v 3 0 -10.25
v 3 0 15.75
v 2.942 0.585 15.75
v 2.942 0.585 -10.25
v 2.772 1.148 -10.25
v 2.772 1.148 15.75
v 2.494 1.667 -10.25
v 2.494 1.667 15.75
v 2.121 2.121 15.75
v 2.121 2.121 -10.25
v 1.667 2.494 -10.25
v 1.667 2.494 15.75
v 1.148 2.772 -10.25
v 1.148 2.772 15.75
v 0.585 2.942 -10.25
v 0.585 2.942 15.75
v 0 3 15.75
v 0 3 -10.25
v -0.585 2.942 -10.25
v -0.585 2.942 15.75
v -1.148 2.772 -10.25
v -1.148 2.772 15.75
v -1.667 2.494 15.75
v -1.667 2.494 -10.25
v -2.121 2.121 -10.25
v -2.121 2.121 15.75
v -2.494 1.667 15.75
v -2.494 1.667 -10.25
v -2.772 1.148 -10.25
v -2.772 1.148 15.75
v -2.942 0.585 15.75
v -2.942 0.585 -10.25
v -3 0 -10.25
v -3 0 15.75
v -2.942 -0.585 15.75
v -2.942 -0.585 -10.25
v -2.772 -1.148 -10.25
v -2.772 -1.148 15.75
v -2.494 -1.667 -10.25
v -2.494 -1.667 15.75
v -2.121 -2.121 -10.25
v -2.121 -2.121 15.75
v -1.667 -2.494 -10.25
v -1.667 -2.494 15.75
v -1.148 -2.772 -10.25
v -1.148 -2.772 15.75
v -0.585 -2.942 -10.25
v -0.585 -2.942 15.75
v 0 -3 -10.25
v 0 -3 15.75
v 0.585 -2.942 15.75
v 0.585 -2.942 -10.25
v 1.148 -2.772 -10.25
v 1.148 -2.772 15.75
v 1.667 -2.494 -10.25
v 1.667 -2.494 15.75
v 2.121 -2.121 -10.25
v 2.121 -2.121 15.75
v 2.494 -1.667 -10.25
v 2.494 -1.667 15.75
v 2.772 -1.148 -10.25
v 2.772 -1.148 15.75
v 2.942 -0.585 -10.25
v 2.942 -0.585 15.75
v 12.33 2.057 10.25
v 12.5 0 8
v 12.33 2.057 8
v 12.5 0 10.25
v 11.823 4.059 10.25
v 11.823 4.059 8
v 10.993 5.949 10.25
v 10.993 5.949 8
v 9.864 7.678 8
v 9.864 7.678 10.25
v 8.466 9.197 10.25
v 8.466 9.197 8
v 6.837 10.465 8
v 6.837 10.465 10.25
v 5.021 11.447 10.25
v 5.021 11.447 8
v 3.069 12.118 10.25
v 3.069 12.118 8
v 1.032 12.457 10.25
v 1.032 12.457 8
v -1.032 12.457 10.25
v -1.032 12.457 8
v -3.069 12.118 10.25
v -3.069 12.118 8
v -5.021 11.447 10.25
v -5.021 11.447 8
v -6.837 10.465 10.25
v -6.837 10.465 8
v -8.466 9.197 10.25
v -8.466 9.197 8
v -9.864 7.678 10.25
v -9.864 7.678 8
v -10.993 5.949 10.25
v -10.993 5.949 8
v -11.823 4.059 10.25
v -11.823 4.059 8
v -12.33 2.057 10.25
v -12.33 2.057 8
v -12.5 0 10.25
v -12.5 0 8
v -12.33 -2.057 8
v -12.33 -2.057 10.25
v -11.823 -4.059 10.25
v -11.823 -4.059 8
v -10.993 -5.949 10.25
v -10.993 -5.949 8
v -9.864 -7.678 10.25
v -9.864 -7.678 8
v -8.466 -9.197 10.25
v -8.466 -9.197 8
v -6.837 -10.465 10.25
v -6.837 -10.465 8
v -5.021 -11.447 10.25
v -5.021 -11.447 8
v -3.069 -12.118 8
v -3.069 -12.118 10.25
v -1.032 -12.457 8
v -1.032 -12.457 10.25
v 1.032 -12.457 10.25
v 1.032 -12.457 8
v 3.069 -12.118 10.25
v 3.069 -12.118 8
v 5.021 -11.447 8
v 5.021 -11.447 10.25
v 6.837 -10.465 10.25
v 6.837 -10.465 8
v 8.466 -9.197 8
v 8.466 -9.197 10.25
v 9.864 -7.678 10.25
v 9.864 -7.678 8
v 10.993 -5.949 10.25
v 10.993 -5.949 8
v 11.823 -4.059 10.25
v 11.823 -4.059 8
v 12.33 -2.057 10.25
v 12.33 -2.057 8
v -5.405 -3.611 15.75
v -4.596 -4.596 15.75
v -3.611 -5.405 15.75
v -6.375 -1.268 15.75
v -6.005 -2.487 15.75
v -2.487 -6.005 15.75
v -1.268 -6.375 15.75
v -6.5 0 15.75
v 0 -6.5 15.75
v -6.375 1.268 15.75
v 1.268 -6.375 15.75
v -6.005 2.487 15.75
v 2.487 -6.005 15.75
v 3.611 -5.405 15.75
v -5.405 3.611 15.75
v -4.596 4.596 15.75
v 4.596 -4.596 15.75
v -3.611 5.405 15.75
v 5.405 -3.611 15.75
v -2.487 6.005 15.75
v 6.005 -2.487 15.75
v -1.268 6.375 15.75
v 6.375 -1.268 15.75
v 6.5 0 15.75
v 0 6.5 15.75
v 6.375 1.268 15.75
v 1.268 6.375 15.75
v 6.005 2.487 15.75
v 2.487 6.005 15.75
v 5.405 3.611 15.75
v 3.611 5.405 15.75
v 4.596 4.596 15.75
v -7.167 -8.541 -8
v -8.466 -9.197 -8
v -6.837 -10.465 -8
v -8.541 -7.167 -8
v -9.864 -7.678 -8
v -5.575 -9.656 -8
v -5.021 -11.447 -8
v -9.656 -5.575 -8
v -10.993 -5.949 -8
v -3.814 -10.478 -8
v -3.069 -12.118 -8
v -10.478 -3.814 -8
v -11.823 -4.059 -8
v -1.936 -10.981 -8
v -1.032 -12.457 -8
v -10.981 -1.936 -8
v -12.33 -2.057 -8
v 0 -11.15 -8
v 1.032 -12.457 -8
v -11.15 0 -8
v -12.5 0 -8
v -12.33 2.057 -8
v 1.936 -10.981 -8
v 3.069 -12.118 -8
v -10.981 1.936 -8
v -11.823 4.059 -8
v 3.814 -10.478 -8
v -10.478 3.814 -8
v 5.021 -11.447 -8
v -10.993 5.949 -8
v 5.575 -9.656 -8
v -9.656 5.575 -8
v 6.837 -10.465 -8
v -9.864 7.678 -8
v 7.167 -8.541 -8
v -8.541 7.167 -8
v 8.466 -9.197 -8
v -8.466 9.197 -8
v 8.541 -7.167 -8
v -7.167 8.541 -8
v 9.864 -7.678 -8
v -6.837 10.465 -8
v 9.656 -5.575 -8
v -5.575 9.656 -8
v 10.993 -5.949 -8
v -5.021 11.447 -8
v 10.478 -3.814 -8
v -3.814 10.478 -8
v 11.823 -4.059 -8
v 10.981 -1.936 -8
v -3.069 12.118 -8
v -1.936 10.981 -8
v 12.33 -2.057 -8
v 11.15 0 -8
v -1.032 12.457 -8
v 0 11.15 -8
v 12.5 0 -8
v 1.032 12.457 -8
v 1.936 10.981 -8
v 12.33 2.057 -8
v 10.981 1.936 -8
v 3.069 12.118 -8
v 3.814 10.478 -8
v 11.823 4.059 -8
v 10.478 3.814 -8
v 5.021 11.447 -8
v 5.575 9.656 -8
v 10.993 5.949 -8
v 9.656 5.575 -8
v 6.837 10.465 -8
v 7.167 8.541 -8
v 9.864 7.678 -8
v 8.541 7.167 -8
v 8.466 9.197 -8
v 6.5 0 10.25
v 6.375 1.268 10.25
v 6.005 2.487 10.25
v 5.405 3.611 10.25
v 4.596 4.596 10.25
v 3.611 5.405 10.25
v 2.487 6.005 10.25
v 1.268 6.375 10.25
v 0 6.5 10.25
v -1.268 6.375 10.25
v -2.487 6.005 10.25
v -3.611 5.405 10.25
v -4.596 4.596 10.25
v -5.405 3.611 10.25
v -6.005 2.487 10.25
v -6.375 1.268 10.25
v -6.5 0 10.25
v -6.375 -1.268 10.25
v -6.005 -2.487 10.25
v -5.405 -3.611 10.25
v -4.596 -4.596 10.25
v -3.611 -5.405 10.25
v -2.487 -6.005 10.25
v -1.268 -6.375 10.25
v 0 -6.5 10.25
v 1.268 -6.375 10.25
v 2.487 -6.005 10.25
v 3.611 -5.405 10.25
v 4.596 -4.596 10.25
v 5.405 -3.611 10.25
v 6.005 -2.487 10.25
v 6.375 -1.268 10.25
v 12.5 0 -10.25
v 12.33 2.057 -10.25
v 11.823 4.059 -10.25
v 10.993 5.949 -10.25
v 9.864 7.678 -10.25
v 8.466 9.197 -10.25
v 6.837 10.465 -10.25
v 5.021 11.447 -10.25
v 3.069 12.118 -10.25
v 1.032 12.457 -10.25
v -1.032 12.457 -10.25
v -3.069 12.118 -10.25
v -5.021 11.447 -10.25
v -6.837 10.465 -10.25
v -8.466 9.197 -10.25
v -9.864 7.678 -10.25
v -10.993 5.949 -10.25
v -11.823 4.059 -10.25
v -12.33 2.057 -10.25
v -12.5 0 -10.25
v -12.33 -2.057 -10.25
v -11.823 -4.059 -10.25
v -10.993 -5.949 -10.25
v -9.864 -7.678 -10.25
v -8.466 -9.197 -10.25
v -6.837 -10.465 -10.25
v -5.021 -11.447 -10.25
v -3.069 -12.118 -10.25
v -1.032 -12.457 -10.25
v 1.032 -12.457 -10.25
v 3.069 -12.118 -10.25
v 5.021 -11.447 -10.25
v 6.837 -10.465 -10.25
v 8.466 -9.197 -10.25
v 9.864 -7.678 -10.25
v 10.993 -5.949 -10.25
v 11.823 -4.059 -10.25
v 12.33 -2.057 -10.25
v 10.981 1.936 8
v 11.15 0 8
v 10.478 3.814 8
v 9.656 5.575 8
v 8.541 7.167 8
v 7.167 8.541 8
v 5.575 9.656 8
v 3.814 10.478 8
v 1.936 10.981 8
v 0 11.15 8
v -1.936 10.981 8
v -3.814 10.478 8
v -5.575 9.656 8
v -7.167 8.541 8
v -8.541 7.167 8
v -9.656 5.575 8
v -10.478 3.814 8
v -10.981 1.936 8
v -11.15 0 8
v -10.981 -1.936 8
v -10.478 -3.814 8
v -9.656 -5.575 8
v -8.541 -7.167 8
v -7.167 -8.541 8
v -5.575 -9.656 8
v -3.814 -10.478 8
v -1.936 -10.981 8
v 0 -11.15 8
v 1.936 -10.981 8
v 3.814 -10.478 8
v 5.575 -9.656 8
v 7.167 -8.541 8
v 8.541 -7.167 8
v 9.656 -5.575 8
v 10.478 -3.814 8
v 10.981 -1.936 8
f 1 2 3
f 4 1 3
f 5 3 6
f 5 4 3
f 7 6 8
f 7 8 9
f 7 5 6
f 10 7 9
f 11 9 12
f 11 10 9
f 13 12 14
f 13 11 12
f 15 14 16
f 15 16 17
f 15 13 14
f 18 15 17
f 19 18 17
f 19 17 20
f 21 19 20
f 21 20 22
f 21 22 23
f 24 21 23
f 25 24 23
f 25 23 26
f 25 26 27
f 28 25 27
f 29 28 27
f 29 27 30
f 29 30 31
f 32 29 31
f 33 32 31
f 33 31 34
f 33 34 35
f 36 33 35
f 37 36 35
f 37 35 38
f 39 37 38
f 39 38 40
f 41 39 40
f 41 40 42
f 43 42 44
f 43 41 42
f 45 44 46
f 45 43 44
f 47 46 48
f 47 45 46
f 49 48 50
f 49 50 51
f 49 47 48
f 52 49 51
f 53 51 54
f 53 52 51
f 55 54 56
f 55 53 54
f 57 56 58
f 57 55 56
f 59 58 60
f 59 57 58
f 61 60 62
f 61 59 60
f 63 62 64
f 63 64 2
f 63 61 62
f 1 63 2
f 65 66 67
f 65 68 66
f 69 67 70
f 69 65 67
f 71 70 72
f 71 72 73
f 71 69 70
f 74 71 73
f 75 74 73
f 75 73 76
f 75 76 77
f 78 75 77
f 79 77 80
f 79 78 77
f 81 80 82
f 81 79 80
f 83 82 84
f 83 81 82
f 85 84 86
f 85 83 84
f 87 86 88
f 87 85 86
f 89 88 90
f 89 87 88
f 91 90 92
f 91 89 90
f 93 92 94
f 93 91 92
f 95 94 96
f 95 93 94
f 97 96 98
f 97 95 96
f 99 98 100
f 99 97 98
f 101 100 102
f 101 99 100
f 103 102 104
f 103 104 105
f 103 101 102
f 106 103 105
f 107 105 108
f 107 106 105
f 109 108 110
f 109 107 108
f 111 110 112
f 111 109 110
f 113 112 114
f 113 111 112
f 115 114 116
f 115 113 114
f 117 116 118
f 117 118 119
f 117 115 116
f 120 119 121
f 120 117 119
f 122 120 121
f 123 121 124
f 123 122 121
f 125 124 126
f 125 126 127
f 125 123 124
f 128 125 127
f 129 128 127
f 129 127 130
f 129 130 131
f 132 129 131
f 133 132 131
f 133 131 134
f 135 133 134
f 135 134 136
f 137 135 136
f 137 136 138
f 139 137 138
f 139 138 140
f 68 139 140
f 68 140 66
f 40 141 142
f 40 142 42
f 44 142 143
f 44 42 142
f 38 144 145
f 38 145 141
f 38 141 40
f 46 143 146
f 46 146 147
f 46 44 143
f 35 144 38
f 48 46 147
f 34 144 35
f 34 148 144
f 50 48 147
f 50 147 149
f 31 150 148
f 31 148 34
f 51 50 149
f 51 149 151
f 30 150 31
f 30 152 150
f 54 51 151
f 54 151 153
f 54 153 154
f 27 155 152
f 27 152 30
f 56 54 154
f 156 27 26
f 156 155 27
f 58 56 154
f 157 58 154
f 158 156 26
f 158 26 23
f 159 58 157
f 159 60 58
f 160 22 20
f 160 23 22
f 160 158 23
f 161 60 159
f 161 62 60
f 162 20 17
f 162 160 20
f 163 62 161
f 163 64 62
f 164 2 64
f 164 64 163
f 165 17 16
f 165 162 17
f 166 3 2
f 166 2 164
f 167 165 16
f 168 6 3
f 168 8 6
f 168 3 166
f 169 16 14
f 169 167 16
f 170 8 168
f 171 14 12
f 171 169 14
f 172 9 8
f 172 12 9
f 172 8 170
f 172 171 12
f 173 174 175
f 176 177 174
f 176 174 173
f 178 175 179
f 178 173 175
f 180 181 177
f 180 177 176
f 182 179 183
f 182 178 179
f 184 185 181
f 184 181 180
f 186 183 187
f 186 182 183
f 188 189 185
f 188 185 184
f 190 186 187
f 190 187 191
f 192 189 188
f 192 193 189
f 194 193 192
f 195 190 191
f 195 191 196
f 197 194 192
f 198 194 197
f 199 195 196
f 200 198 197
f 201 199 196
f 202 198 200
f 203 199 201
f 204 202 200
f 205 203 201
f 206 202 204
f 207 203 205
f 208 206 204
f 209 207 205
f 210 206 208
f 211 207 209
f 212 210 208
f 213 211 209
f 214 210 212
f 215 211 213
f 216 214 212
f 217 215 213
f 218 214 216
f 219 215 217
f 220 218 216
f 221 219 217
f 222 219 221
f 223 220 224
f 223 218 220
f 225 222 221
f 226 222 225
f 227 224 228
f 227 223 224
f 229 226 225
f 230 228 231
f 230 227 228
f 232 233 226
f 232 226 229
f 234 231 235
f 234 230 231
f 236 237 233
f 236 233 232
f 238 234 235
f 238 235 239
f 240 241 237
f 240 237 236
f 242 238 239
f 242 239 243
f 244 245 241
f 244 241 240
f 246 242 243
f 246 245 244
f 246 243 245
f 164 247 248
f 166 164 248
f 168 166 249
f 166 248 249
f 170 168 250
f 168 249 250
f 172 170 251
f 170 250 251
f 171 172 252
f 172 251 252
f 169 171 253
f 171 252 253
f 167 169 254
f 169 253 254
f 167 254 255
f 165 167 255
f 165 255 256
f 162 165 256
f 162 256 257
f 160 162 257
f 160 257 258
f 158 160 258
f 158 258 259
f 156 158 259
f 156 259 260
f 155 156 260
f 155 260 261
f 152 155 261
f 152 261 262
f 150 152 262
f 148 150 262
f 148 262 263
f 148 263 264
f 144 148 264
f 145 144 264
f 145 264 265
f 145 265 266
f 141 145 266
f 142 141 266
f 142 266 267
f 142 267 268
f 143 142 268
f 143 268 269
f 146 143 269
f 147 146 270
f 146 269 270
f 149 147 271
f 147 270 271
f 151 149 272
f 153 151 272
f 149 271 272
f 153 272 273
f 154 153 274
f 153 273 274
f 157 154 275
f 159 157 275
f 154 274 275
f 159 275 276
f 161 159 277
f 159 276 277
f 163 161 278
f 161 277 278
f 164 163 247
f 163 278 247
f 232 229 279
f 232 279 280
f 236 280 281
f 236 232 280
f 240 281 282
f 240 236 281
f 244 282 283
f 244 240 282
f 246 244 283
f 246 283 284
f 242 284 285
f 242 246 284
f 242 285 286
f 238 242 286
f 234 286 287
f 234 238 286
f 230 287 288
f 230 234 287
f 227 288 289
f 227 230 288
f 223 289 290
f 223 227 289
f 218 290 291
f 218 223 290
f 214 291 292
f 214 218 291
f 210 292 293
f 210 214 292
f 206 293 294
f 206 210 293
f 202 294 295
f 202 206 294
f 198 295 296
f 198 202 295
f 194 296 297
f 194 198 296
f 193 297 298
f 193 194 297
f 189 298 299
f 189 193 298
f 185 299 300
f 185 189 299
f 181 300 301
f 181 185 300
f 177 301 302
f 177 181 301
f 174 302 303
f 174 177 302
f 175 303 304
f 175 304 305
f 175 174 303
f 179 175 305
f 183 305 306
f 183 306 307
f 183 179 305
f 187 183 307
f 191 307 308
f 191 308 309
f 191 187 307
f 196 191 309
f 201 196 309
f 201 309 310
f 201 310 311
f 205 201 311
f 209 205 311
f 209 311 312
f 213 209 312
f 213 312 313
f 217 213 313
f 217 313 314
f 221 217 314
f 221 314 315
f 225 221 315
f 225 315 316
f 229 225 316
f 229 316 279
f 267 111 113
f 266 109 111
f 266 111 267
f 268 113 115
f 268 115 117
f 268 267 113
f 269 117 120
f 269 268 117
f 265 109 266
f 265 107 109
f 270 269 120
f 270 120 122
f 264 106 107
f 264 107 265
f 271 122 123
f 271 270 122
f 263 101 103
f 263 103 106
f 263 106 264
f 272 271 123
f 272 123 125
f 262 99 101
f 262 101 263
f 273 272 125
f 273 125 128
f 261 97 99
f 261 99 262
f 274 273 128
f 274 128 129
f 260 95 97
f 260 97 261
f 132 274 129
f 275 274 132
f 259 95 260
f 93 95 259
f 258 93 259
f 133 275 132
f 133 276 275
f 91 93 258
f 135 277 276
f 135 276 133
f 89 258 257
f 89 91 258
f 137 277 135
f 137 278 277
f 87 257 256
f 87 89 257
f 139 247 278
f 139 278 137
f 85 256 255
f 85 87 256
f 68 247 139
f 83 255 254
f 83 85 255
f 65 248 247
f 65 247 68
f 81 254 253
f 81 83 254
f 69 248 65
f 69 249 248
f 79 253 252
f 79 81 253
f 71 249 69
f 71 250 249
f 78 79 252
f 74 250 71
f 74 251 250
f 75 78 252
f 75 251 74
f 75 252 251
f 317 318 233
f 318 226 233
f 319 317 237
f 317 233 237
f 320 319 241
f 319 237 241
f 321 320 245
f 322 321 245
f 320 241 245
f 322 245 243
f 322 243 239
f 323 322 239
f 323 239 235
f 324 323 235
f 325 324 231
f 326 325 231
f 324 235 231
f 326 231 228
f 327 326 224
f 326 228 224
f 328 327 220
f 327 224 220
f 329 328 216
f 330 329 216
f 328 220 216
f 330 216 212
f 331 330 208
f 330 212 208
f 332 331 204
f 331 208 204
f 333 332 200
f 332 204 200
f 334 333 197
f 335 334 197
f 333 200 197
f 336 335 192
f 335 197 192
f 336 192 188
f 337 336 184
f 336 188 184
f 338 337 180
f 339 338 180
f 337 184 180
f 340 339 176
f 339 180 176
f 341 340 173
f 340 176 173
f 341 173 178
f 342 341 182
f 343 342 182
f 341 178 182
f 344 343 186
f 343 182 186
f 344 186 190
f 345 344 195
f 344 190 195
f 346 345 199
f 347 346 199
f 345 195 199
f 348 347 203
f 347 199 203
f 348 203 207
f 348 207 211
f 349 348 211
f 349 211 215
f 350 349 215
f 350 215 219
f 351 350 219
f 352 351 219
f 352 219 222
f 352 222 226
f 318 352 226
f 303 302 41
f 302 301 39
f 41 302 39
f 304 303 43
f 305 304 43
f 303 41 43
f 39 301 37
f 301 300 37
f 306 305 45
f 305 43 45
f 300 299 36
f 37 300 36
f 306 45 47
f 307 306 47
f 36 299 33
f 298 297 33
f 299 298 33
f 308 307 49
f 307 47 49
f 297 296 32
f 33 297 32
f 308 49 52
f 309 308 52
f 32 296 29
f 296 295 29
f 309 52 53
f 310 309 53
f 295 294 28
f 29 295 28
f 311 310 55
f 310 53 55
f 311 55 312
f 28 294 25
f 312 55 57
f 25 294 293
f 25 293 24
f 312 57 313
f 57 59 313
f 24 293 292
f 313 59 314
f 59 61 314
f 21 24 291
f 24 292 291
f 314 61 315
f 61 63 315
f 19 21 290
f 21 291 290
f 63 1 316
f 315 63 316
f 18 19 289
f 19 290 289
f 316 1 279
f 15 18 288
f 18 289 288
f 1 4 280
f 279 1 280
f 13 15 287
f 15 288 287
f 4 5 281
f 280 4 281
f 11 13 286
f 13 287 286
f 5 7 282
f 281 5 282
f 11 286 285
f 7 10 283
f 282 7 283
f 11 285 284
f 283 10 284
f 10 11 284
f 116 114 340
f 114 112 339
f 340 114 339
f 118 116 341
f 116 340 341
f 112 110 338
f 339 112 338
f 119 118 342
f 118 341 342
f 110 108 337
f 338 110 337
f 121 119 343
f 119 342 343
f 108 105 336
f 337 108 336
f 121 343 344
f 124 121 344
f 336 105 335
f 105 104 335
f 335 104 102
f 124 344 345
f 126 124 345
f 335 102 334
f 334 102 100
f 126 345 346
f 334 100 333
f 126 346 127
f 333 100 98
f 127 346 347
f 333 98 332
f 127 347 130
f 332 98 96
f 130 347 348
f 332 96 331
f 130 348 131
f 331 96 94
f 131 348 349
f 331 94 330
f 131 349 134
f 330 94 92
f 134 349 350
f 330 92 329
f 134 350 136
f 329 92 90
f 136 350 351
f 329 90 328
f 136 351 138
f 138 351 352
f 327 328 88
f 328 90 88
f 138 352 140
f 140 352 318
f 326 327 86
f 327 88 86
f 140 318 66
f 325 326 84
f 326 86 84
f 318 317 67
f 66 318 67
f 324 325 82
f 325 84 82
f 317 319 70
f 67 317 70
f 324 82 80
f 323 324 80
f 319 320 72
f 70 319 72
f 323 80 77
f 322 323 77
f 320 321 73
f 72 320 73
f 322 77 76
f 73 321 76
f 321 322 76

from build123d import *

# Parameters (mm, degrees)
F0_R     = 12.5
F0_R_2   = 11.15
F0_R_3   = 6.5
F0_R_4   = 3
F1_DEPTH = 10.25
F2_DEPTH = 8
F3_DEPTH = 15.75


with BuildPart() as f1:
    # F0 (on Top) → F1 (new body, symmetric)
    with BuildSketch(Plane.XY):
        Circle(F0_R)
        Circle(F0_R_2, mode=Mode.SUBTRACT)
        Circle(F0_R_2)
        Circle(F0_R_3, mode=Mode.SUBTRACT)
        Circle(F0_R_3)
        Circle(F0_R_4, mode=Mode.SUBTRACT)
    extrude(amount=F1_DEPTH, both=True)

    # F0 (on Top) → F2 (cut, symmetric)
    with BuildSketch(Plane.XY):
        Circle(F0_R)
        Circle(F0_R_2, mode=Mode.SUBTRACT)
    extrude(amount=F2_DEPTH, both=True, mode=Mode.SUBTRACT)

    # F0 (on Top) → F3 (join)
    with BuildSketch(Plane.XY):
        Circle(F0_R_3)
        Circle(F0_R_4, mode=Mode.SUBTRACT)
    extrude(amount=F3_DEPTH)


solid = f1.part
